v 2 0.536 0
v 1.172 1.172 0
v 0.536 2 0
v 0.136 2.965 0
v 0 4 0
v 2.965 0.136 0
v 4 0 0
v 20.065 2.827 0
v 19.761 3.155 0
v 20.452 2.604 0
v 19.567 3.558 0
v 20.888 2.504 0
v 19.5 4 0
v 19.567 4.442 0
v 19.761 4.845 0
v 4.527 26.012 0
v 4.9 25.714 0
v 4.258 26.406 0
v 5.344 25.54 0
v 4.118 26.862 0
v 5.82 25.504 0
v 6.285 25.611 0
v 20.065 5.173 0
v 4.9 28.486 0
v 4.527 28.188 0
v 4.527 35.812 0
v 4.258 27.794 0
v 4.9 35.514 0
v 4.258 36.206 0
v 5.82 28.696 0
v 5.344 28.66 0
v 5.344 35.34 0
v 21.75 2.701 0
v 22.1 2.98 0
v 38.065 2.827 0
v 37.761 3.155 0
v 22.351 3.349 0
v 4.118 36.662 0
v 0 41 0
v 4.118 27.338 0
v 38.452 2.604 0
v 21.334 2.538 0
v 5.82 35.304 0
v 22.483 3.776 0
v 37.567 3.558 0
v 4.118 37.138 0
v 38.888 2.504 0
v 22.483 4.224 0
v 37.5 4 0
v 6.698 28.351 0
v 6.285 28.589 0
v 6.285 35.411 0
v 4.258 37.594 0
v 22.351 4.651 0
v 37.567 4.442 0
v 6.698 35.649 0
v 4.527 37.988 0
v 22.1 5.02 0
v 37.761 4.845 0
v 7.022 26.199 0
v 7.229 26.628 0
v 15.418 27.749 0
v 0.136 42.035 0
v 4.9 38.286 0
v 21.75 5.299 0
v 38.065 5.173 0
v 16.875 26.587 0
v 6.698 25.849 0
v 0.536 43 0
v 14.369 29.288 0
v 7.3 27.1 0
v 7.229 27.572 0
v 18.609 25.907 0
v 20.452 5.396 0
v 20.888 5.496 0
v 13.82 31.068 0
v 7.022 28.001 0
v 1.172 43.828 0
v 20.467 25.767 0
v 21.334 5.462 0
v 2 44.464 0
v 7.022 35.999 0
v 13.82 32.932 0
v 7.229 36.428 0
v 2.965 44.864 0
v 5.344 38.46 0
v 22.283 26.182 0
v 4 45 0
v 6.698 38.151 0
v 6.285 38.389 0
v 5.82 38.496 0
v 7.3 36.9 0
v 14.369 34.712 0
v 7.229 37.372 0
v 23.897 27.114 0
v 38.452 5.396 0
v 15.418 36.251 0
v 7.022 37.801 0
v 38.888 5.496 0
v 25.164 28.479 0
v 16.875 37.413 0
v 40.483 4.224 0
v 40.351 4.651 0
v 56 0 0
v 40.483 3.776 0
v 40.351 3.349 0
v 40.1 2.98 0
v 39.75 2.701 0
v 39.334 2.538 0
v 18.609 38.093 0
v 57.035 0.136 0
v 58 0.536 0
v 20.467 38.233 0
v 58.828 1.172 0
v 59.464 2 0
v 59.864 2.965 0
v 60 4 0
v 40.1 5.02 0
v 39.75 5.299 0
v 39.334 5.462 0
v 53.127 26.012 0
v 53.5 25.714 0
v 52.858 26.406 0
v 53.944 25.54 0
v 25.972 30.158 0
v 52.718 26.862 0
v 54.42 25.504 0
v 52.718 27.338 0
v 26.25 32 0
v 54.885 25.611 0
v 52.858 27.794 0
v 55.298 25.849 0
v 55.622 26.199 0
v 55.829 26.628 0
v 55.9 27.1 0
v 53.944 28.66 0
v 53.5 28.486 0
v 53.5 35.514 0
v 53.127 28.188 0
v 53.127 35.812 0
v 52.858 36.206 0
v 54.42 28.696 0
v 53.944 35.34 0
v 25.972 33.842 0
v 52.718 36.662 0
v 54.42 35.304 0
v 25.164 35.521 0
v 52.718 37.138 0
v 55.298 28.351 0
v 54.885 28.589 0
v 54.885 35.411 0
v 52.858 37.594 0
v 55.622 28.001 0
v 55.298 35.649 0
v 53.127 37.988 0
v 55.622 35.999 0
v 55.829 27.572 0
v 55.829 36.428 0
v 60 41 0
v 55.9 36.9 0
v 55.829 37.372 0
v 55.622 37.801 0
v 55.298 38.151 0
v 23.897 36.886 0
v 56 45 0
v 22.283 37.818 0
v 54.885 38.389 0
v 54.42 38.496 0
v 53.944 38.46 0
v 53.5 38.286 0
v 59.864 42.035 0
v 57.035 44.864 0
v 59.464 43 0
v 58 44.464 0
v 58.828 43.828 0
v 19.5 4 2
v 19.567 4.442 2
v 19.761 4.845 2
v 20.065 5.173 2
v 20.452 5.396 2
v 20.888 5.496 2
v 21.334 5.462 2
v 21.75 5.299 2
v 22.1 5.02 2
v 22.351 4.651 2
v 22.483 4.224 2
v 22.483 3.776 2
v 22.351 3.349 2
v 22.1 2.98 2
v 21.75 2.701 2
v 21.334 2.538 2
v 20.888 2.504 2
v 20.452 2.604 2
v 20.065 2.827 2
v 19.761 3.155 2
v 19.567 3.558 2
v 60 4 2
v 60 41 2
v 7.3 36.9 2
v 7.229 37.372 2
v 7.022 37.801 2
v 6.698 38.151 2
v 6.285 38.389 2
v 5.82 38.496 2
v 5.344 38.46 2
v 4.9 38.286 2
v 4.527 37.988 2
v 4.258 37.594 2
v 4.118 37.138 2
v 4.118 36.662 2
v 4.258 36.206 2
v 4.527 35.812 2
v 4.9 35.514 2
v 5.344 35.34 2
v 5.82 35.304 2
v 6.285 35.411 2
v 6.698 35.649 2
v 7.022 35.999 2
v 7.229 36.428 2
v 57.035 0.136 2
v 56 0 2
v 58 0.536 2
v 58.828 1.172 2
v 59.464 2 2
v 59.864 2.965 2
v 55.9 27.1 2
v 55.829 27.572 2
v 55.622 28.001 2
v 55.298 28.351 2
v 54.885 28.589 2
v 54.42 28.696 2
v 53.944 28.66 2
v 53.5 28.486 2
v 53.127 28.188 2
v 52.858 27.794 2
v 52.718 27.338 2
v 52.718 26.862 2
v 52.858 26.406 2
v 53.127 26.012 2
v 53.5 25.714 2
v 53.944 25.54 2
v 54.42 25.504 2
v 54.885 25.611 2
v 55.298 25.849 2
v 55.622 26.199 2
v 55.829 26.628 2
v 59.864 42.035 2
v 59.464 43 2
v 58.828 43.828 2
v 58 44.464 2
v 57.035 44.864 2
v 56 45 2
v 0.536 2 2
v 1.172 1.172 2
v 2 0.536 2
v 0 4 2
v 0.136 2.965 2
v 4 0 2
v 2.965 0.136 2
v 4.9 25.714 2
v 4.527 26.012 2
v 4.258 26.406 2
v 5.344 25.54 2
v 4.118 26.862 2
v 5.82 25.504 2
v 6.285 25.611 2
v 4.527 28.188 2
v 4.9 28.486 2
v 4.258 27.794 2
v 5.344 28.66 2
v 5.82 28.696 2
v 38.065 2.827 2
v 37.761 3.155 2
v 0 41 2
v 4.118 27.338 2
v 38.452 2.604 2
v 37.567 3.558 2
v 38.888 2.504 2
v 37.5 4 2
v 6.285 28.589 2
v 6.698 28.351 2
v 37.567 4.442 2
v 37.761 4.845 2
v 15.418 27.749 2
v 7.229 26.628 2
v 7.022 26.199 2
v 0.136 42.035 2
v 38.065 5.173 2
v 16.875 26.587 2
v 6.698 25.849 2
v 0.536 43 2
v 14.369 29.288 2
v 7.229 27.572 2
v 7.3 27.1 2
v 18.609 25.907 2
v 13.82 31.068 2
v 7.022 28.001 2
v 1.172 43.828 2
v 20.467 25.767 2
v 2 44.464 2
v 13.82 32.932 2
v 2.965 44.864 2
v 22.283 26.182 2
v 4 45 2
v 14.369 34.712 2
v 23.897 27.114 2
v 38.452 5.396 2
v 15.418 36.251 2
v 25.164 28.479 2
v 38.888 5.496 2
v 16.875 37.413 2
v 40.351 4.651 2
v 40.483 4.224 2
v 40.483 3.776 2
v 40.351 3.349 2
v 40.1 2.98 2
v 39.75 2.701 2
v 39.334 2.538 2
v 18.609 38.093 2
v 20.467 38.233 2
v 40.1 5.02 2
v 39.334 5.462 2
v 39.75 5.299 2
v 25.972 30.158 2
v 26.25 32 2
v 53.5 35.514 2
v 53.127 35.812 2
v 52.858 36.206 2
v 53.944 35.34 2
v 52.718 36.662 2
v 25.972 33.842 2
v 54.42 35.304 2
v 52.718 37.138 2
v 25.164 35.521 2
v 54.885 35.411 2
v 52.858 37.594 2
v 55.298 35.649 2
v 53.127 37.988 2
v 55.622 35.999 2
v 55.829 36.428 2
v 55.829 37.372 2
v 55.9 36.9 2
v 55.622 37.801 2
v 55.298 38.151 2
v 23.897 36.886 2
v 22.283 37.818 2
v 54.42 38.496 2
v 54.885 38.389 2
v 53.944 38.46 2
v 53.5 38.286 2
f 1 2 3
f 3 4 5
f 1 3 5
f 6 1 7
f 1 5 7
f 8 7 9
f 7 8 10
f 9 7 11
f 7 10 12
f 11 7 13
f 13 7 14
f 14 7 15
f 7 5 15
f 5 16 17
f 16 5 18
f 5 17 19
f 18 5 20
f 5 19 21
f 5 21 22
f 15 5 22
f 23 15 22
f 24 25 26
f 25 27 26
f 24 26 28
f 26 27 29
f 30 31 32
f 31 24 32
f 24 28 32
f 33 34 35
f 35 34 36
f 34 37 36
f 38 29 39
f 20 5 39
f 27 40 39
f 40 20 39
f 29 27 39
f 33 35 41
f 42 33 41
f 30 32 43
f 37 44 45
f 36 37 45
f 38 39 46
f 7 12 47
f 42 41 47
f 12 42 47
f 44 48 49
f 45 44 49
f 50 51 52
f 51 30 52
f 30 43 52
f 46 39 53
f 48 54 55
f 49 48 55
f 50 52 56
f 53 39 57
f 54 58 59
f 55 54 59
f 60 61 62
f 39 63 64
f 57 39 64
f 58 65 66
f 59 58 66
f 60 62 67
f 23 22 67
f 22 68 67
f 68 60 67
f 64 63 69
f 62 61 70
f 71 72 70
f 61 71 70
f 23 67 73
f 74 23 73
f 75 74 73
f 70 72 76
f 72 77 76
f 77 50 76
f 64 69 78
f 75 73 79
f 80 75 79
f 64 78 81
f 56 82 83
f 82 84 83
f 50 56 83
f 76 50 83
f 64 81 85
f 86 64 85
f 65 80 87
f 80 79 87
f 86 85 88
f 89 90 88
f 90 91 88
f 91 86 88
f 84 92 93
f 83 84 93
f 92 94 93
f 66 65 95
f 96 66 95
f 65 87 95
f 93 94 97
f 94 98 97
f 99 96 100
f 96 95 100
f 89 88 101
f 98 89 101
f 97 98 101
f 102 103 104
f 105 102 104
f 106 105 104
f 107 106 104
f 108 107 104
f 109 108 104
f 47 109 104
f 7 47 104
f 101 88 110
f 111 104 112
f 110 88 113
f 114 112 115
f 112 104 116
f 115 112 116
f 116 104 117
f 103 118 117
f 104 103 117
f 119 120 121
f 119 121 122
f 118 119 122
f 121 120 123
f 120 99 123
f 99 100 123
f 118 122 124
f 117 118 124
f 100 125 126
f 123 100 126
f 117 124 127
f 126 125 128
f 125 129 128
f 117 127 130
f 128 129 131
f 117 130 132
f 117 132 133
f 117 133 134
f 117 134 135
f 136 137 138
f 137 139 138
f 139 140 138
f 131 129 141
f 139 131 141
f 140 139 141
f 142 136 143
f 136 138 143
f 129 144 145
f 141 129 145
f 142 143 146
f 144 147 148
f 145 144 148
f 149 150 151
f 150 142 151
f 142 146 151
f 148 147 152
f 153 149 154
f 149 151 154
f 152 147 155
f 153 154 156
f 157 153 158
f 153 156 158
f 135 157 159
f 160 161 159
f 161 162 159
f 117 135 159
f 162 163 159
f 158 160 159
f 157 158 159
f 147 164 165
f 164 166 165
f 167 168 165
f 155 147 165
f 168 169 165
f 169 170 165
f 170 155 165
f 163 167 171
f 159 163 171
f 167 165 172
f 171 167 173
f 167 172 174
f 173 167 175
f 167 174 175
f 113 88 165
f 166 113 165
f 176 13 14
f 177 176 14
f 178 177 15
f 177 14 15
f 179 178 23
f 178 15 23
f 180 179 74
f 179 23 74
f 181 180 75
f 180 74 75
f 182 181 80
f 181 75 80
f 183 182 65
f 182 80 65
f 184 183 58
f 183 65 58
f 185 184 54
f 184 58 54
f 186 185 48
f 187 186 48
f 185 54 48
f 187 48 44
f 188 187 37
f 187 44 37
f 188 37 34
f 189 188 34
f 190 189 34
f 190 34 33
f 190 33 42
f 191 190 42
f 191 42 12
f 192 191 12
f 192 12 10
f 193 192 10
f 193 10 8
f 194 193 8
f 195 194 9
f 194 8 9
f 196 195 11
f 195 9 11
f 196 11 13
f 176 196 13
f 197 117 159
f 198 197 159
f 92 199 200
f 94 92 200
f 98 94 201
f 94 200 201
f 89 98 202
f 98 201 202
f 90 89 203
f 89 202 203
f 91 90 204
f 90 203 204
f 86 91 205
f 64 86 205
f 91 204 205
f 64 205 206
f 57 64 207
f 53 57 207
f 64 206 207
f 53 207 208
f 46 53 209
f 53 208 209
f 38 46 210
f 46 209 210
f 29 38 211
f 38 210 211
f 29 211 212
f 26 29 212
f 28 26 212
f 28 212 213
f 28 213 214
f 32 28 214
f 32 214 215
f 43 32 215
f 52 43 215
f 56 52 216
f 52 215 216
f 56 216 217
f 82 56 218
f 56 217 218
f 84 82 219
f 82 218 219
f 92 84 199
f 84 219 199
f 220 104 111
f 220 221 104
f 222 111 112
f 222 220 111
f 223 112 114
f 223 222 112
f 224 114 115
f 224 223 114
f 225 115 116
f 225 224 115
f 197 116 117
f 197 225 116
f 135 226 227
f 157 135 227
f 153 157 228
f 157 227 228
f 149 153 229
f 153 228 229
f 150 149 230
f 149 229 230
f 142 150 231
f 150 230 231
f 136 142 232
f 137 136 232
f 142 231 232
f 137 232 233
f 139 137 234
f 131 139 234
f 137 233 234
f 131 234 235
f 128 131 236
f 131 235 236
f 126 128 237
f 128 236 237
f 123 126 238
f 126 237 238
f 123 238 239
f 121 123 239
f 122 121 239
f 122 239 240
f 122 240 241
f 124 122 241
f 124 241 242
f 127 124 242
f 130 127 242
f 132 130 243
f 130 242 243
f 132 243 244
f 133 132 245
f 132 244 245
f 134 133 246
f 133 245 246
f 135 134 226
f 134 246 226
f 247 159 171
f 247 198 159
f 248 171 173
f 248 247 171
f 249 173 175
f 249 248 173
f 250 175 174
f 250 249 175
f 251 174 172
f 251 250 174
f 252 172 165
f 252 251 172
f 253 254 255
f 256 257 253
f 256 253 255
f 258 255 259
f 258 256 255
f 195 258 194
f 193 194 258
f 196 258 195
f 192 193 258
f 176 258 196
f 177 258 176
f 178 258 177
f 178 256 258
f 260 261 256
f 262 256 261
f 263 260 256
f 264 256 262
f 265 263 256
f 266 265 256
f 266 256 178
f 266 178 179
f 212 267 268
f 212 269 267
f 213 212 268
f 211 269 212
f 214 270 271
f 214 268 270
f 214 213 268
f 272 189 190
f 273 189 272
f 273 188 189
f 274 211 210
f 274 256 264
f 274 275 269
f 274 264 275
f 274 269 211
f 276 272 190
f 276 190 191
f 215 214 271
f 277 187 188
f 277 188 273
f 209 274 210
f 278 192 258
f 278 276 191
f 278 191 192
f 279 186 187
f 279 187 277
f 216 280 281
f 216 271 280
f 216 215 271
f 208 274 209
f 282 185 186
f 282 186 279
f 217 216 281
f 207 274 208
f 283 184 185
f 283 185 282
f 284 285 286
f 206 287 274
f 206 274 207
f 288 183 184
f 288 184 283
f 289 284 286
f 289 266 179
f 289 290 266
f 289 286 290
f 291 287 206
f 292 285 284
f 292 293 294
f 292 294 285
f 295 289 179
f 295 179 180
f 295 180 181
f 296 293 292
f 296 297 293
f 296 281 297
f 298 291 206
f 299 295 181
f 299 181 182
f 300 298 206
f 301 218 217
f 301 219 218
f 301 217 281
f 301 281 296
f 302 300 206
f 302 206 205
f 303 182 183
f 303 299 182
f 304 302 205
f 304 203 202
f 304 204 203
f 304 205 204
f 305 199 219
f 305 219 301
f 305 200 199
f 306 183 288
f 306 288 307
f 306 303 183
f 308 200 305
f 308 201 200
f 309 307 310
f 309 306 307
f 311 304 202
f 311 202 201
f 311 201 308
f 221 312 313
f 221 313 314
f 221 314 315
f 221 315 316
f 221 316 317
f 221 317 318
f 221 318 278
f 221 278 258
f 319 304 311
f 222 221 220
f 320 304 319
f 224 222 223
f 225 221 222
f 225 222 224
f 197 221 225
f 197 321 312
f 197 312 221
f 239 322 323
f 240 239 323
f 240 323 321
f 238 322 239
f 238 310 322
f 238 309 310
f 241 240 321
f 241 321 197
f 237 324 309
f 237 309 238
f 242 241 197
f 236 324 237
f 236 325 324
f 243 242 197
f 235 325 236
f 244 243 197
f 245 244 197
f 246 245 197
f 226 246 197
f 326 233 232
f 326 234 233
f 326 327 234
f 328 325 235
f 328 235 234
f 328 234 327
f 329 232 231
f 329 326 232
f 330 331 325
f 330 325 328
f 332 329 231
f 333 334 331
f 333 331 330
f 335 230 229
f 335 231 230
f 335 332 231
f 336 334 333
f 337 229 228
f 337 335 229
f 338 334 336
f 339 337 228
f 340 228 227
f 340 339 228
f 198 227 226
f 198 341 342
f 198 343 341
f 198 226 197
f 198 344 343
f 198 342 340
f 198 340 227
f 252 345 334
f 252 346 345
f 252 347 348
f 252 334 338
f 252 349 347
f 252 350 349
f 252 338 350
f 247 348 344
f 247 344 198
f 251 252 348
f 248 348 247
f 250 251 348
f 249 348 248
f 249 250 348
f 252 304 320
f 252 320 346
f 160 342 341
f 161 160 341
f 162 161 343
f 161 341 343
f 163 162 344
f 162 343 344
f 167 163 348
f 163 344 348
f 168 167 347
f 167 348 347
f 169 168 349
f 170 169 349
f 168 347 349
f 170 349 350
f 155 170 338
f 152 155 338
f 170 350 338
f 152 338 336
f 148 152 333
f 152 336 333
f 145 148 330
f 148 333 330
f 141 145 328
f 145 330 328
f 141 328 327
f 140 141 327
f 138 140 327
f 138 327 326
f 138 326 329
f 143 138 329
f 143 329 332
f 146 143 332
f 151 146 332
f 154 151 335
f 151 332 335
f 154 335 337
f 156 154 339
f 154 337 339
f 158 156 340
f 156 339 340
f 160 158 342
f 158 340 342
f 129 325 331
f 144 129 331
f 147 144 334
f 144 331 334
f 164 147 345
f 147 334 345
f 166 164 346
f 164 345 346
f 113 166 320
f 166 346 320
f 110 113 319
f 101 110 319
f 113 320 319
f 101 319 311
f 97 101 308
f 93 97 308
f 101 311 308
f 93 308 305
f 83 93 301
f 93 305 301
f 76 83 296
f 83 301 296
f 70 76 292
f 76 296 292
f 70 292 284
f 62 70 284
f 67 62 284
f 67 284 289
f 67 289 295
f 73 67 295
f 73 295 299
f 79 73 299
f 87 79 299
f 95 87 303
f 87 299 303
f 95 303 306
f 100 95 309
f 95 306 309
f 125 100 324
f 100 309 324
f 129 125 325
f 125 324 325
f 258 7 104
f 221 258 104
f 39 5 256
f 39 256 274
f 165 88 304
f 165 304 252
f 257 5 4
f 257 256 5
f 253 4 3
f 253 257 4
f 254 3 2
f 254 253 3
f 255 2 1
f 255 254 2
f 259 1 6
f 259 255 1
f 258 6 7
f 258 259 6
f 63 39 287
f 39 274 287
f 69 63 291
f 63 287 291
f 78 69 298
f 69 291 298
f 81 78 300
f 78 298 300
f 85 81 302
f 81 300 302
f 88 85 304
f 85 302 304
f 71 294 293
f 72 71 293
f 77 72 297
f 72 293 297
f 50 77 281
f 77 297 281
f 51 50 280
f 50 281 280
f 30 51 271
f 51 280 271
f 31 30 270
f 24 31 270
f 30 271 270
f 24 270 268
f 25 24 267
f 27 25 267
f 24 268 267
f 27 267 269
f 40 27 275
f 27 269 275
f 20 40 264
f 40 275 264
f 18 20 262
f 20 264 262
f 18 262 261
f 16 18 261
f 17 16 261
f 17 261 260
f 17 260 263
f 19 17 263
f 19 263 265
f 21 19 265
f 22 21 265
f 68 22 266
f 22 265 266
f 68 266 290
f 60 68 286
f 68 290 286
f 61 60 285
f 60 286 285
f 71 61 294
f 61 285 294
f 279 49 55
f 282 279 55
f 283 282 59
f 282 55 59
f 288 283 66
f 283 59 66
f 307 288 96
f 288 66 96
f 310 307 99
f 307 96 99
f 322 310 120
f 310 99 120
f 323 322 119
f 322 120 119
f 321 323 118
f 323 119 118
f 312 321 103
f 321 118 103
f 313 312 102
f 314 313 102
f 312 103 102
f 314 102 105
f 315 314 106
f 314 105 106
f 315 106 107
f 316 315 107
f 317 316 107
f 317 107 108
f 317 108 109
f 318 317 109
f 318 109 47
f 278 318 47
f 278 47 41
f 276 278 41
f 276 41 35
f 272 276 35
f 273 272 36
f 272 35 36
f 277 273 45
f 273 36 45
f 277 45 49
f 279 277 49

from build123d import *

# Parameters (mm, degrees)
SKETCH_1_W          = 60
SKETCH_1_H          = 45
EXTRUDE_1_DEPTH     = 2
FILLET_1_R          = 4
SKETCH_2_R          = 1.5
CUT_EXTRUDE_1_DEPTH = 2
SKETCH_3_R          = 1.6
CUT_EXTRUDE_2_DEPTH = 2
SKETCH_4_R          = 6.25
CUT_EXTRUDE_3_DEPTH = 2


with BuildPart() as part:
    # 草图1 → 凸台-拉伸1 (new body)
    with BuildSketch(Plane.XY):
        with Locations((30, 22.5)):
            Rectangle(SKETCH_1_W, SKETCH_1_H)
    extrude(amount=EXTRUDE_1_DEPTH)

    # 圆角1
    fillet_1_edges = [part.edges().sort_by_distance(p)[0] for p in [
        (0, 45, 1),
        (60, 45, 1),
        (60, 0, 1),
        (0, 0, 1),
    ]]
    fillet(fillet_1_edges, radius=FILLET_1_R)

    # 草图2 → 切除-拉伸1 (cut)
    with BuildSketch(Plane(origin=(0, 0, 0), x_dir=(-1, 0, 0), z_dir=(0, 0, -1))):
        with Locations((-39, 4)):
            Circle(SKETCH_2_R)
        with Locations((-21, 4)):
            Circle(SKETCH_2_R)
    extrude(amount=-CUT_EXTRUDE_1_DEPTH, mode=Mode.SUBTRACT)

    # 草图3 → 切除-拉伸2 (cut)
    with BuildSketch(Plane.XY.offset(2)):
        with Locations((5.7, 36.9)):
            Circle(SKETCH_3_R)
        with Locations((5.7, 27.1)):
            Circle(SKETCH_3_R)
        with Locations((54.3, 36.9)):
            Circle(SKETCH_3_R)
        with Locations((54.3, 27.1)):
            Circle(SKETCH_3_R)
    extrude(amount=-CUT_EXTRUDE_2_DEPTH, mode=Mode.SUBTRACT)

    # 草图4 → 切除-拉伸3 (cut)
    with BuildSketch(Plane.XY.offset(2)):
        with Locations((20, 32)):
            Circle(SKETCH_4_R)
    extrude(amount=-CUT_EXTRUDE_3_DEPTH, mode=Mode.SUBTRACT)


solid = part.part
